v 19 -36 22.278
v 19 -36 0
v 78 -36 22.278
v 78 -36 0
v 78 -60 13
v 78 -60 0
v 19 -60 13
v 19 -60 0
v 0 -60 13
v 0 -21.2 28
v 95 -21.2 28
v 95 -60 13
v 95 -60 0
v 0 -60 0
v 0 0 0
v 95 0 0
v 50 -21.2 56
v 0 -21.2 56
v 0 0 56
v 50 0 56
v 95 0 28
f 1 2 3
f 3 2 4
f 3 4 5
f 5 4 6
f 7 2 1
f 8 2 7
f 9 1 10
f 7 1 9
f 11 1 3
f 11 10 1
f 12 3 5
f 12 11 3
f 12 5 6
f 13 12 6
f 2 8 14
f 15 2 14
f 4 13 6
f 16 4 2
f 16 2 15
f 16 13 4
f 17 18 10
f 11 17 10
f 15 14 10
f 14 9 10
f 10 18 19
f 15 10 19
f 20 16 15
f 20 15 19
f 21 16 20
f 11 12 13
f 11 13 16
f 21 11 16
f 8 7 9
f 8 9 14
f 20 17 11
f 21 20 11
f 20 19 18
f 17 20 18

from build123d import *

# Parameters (mm, degrees)
F1_DEPTH = 95
F3_DEPTH = 21.2002830101
F5_DEPTH = 25
F6_W     = 59
F6_H     = 24
F7_DEPTH = 30


with BuildPart() as f1:
    # F0 (on Right) → F1 (new body)
    with BuildSketch(Plane.YZ):
        Polygon((-60, 0), (0, 0), (0, 56), (-21.2002830101, 56), (-21.2002830101, 28), (-60, 13), align=None)
    extrude(amount=-F1_DEPTH)

    # F2 (on face) → F3 (join, through all)
    with BuildSketch(Plane.XZ.offset(21.2002830101)):
        Polygon((0, 56), (-38.8899631798, 56), (0, 28), align=None)
    extrude(amount=-F3_DEPTH)

    # F4 (on face) → F5 (cut)
    with BuildSketch(Plane.XZ.offset(21.2002830101)):
        Polygon((0, 56), (-45, 56), (0, 28), align=None)
    extrude(amount=-F5_DEPTH, mode=Mode.SUBTRACT)

    # F6 (on face) → F7 (cut)
    with BuildSketch(Plane(origin=(0, 0, 0), x_dir=(1, 0, 0), z_dir=(0, 0, -1))):
        with Locations((-46.5, 48)):
            Rectangle(F6_W, F6_H)
    extrude(amount=-F7_DEPTH, mode=Mode.SUBTRACT)


with BuildPart() as f1_1:
    # F8: moved
    add(f1.part.moved(Location((95, 0, 0))))


solid = f1_1.part
